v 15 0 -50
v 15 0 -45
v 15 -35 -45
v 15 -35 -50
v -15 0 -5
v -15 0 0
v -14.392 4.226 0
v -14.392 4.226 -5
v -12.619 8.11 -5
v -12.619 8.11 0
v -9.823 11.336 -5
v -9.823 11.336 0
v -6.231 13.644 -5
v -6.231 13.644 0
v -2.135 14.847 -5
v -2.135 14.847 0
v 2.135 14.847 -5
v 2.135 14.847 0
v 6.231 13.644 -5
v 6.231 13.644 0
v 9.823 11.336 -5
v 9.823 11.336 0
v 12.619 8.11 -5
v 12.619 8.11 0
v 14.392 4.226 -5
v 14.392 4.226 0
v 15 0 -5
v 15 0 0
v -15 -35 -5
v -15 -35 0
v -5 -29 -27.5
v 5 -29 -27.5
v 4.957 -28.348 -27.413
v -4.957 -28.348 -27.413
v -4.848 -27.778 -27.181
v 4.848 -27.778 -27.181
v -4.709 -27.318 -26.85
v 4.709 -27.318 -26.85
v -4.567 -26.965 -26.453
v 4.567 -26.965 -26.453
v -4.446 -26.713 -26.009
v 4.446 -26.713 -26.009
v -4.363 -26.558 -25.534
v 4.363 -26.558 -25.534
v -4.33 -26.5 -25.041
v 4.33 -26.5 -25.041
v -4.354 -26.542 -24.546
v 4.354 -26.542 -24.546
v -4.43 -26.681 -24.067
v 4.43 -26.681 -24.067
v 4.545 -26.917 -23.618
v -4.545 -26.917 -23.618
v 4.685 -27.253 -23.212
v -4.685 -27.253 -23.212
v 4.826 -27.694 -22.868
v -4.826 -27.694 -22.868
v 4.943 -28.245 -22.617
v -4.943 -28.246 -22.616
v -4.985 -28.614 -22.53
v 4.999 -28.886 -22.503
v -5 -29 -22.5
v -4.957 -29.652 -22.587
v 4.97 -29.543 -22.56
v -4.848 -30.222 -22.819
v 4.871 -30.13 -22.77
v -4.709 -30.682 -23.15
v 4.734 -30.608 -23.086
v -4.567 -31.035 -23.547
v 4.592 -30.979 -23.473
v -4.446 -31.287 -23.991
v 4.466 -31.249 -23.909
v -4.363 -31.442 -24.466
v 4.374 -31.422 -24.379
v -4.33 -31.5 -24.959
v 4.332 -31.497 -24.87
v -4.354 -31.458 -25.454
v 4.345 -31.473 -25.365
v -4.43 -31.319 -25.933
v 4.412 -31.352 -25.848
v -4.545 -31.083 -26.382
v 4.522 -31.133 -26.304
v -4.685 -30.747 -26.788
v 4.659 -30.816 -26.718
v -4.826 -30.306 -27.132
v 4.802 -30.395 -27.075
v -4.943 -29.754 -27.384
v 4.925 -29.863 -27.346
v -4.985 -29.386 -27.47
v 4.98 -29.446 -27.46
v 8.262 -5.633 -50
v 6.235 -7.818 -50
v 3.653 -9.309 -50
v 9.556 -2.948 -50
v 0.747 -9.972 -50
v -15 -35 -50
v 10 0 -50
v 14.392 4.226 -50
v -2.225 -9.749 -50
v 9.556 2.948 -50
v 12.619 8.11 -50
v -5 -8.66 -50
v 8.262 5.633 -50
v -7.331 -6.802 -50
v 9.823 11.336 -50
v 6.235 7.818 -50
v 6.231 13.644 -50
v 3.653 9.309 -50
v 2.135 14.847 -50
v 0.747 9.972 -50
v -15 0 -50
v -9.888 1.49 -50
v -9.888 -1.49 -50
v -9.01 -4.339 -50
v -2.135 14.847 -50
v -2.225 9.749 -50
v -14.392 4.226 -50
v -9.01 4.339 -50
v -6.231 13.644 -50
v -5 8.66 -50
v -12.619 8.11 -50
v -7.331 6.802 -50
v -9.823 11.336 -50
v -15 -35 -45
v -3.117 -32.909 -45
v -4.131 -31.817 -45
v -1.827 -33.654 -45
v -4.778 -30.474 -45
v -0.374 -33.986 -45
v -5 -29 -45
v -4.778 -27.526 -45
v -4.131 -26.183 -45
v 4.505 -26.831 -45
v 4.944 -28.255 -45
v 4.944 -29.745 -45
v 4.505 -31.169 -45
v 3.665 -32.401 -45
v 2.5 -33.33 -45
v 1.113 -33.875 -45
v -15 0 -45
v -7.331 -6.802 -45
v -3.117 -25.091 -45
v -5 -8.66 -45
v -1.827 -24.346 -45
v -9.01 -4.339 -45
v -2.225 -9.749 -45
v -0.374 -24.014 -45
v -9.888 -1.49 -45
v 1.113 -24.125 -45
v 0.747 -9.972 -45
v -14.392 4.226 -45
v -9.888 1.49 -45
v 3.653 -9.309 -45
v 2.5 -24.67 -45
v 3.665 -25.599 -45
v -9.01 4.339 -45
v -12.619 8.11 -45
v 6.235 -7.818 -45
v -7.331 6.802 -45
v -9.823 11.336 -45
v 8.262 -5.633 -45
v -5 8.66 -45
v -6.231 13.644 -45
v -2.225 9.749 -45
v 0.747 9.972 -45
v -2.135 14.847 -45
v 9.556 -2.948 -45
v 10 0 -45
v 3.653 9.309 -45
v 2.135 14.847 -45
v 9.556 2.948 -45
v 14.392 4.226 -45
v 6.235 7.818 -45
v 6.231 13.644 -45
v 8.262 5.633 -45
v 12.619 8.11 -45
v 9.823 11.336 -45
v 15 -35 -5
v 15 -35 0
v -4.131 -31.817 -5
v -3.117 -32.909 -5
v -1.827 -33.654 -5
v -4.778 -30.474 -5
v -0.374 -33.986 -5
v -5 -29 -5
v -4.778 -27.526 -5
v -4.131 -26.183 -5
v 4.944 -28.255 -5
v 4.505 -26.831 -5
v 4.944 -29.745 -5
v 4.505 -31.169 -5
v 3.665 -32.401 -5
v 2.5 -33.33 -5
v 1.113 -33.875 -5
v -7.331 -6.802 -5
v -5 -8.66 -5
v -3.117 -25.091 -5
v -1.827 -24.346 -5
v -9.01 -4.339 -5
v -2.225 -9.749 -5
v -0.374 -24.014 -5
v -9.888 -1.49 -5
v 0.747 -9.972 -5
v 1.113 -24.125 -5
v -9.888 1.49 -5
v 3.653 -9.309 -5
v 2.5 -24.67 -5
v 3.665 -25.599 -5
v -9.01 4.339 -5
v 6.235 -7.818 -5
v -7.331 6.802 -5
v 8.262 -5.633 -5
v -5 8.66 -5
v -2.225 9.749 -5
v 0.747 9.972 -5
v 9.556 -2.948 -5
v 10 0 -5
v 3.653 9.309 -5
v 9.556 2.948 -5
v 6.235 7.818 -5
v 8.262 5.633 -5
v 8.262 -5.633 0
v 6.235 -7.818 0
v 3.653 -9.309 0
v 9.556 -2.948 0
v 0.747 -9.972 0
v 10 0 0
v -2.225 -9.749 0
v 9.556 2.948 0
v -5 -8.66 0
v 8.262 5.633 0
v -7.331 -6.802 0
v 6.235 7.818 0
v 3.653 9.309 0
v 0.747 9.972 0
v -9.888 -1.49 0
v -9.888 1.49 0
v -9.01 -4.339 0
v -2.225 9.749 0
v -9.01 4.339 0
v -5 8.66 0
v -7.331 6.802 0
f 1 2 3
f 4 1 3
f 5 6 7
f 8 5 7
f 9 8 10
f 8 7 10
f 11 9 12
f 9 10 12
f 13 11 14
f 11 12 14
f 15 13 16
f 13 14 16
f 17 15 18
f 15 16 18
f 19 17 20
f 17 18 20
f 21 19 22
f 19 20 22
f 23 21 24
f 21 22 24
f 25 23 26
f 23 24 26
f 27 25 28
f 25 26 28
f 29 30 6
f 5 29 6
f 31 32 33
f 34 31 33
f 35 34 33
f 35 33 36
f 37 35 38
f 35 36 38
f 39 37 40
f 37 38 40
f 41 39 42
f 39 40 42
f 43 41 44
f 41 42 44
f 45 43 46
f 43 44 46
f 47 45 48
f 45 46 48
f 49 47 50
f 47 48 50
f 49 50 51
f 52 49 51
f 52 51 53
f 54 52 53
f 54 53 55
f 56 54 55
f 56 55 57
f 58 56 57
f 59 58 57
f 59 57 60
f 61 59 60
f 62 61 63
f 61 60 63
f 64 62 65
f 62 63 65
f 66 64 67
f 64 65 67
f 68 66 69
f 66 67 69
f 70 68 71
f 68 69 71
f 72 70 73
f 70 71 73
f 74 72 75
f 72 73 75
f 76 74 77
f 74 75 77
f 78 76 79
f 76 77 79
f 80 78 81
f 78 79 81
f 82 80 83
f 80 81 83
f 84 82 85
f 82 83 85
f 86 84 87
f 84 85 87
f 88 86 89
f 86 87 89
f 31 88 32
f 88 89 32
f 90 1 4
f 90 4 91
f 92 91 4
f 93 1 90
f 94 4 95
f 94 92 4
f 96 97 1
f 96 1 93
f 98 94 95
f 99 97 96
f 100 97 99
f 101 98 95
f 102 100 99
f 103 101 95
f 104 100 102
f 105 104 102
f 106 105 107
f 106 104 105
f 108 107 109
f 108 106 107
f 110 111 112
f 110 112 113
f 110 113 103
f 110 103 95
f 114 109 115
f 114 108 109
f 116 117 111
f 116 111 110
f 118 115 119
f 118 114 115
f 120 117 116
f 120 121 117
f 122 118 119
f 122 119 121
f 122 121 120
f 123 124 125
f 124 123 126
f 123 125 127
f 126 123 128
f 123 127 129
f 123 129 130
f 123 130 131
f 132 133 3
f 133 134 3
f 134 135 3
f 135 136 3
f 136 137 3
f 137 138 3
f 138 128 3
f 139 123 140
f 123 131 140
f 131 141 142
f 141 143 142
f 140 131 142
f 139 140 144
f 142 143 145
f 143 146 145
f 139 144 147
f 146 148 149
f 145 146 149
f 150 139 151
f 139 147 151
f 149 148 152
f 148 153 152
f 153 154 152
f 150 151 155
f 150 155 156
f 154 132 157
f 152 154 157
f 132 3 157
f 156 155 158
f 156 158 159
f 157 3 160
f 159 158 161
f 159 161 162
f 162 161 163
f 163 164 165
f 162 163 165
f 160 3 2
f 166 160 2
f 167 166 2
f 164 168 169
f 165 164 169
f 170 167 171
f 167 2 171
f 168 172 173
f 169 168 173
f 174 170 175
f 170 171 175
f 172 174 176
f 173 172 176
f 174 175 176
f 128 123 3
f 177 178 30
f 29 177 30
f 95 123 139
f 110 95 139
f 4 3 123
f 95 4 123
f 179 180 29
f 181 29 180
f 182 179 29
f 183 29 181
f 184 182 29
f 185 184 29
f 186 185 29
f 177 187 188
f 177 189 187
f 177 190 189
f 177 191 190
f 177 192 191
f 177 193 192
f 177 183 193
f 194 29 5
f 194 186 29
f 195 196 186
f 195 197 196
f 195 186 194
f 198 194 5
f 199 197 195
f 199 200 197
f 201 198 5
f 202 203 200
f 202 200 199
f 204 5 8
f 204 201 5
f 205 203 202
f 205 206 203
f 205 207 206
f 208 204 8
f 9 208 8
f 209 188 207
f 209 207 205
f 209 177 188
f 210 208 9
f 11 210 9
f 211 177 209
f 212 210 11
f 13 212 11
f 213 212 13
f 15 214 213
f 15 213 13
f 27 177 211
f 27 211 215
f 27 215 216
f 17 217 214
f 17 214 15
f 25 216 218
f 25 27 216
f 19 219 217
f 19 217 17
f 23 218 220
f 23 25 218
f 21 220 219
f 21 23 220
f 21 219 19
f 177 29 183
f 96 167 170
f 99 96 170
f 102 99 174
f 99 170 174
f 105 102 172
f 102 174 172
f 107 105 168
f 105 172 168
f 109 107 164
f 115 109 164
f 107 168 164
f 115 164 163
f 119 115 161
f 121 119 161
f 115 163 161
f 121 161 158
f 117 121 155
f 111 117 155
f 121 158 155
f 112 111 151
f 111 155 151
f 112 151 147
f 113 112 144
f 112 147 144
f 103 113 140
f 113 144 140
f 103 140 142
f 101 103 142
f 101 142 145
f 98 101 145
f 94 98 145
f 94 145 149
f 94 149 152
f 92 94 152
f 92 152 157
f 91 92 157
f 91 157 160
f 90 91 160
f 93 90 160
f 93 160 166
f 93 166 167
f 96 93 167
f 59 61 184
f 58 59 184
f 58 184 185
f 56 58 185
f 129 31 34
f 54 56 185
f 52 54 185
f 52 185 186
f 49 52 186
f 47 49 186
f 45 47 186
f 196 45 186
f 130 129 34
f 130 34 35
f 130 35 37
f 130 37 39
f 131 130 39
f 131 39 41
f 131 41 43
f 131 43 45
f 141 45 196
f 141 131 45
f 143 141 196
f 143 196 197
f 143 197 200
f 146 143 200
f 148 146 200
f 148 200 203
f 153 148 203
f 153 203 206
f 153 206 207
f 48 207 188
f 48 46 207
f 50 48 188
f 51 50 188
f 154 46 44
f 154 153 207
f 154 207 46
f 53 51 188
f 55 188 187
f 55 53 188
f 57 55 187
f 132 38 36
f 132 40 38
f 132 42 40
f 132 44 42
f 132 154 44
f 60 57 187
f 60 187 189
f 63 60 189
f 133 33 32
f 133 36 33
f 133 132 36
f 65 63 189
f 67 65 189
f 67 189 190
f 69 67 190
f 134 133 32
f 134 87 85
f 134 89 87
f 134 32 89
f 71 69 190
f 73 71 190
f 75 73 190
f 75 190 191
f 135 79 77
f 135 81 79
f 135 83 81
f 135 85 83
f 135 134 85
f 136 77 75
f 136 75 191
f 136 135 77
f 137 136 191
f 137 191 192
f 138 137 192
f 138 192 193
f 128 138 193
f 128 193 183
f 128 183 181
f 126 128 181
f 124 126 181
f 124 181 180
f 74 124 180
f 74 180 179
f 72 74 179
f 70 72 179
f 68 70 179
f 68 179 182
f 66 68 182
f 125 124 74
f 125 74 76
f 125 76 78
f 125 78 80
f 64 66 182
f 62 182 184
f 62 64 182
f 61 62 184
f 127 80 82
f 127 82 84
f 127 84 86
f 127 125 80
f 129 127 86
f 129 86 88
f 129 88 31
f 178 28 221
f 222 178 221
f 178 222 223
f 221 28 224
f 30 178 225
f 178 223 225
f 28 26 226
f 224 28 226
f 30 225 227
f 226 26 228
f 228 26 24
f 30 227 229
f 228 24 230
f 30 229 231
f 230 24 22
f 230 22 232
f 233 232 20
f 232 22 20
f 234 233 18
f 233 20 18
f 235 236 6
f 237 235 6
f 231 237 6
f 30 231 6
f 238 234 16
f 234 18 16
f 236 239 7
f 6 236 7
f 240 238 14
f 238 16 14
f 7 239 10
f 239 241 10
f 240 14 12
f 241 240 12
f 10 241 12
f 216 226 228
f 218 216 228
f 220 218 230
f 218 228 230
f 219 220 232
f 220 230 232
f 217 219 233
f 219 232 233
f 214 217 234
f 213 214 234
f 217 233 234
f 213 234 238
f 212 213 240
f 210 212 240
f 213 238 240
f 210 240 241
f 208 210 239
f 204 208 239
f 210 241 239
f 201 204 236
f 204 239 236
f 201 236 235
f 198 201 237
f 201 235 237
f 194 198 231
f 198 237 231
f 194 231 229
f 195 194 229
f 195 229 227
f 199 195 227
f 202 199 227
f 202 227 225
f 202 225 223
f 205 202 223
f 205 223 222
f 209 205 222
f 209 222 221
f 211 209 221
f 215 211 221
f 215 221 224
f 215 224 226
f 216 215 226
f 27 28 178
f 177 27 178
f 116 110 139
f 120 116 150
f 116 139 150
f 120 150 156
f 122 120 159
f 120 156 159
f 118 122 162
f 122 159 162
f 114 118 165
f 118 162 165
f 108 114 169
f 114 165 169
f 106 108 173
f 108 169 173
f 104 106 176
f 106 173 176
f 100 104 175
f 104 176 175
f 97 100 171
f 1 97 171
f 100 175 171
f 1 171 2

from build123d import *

# Parameters (mm, degrees)
SKETCH2_R           = 10
BOSS_EXTRUDE1_DEPTH = 50
SKETCH3_W           = 40
SKETCH3_H           = 50
CUT_EXTRUDE1_DEPTH  = 55
SKETCH4_R           = 5
BOSS_EXTRUDE2_DEPTH = 48
SKETCH5_R           = 2.5
CUT_EXTRUDE2_DEPTH  = 10


with BuildPart() as part:
    # Sketch2 → Boss-Extrude1 (new body)
    with BuildSketch(Plane.XY):
        with BuildLine():
            Line((15, 0), (15, -35))
            Line((15, -35), (-15, -35))
            Line((-15, -35), (-15, 0))
            ThreePointArc((-15, 0), (0, 15), (15, 0))
        make_face()
        Circle(SKETCH2_R, mode=Mode.SUBTRACT)
    extrude(amount=-BOSS_EXTRUDE1_DEPTH)

    # Sketch3 → Cut-Extrude1 (cut)
    with BuildSketch(Plane(origin=(15, 0, 0), x_dir=(0, 0, -1), z_dir=(1, 0, 0))):
        with Locations((25, -10)):
            Rectangle(SKETCH3_W, SKETCH3_H)
    extrude(amount=-CUT_EXTRUDE1_DEPTH, mode=Mode.SUBTRACT)


with BuildPart() as cut_extrude1_piece_1:
    # of the separate pieces the step leaves, piece 1, a body of its own (cut_extrude1_pieces)
    add(part.part.solids().sort_by_distance((15, 0, 0))[0])



with BuildPart() as cut_extrude1_piece_2:
    # of the separate pieces the step leaves, piece 2, a body of its own (cut_extrude1_pieces)
    add(part.part.solids().sort_by_distance((15, 0, -45))[0])


with BuildPart() as cut_extrude1_piece_1_1:
    add(cut_extrude1_piece_1.part)

    add(cut_extrude1_piece_2.part)  # Boss-Extrude2 merges Cut-Extrude1 piece 2
    # Sketch4 → Boss-Extrude2 (add)
    with BuildSketch(Plane(origin=(0, 0, -50), x_dir=(-1, 0, 0), z_dir=(0, 0, -1))):
        with Locations((0, -29)):
            Circle(SKETCH4_R)
    extrude(amount=-BOSS_EXTRUDE2_DEPTH)

    # Sketch5 → Cut-Extrude2 (cut, symmetric)
    with BuildSketch(Plane(origin=(0, 0, 0), x_dir=(0, 0, -1), z_dir=(1, 0, 0))):
        with Locations((25, -29)):
            Circle(SKETCH5_R)
    extrude(amount=CUT_EXTRUDE2_DEPTH, both=True, mode=Mode.SUBTRACT)


solid = cut_extrude1_piece_1_1.part
